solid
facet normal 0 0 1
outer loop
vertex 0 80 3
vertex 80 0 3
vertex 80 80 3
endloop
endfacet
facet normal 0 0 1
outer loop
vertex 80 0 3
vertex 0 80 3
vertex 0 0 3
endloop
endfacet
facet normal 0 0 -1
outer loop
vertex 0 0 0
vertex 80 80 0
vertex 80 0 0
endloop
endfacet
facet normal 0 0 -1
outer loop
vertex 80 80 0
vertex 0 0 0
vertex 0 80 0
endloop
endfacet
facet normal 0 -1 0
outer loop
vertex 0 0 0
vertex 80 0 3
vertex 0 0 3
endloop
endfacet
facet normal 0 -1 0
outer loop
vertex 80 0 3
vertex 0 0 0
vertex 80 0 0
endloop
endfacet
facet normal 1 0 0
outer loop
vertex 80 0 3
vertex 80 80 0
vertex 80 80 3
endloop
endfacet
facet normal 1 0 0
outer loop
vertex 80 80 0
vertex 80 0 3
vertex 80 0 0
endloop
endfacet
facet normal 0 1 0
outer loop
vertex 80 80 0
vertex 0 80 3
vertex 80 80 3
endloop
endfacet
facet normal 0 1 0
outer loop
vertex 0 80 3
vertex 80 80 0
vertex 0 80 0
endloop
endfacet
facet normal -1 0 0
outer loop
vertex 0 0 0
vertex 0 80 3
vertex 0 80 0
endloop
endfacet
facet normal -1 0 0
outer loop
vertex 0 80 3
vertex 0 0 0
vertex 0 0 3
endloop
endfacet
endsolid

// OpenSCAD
/*
Title: Scaffold - Scale Reference Tiles
Folder: 01_units_scaling
Physics Topic: Planned extension
Difficulty: Scaffold
Print Type: FDM
Teaches: Future concept module
Use Case: Planned classroom extension
*/

// --------------------
// Parameters
// --------------------
base_size = 80;
thickness = 3;

module scaffold_placeholder(){
    cube([base_size,base_size,thickness]);
}

// --------------------
// Physics Meaning
// --------------------
// Scaffold file with geometry placeholder and planned educational direction.

// --------------------
// Learning Notes
// --------------------
// TODO: add activity prompts and comparative parameter sweeps.

// --------------------
// Print Notes
// --------------------
// TODO: finalize orientation and durability tuning.

// --------------------
// Customization Ideas
// --------------------
// TODO: convert placeholder to fully featured model in roadmap sequence.

scaffold_placeholder();
